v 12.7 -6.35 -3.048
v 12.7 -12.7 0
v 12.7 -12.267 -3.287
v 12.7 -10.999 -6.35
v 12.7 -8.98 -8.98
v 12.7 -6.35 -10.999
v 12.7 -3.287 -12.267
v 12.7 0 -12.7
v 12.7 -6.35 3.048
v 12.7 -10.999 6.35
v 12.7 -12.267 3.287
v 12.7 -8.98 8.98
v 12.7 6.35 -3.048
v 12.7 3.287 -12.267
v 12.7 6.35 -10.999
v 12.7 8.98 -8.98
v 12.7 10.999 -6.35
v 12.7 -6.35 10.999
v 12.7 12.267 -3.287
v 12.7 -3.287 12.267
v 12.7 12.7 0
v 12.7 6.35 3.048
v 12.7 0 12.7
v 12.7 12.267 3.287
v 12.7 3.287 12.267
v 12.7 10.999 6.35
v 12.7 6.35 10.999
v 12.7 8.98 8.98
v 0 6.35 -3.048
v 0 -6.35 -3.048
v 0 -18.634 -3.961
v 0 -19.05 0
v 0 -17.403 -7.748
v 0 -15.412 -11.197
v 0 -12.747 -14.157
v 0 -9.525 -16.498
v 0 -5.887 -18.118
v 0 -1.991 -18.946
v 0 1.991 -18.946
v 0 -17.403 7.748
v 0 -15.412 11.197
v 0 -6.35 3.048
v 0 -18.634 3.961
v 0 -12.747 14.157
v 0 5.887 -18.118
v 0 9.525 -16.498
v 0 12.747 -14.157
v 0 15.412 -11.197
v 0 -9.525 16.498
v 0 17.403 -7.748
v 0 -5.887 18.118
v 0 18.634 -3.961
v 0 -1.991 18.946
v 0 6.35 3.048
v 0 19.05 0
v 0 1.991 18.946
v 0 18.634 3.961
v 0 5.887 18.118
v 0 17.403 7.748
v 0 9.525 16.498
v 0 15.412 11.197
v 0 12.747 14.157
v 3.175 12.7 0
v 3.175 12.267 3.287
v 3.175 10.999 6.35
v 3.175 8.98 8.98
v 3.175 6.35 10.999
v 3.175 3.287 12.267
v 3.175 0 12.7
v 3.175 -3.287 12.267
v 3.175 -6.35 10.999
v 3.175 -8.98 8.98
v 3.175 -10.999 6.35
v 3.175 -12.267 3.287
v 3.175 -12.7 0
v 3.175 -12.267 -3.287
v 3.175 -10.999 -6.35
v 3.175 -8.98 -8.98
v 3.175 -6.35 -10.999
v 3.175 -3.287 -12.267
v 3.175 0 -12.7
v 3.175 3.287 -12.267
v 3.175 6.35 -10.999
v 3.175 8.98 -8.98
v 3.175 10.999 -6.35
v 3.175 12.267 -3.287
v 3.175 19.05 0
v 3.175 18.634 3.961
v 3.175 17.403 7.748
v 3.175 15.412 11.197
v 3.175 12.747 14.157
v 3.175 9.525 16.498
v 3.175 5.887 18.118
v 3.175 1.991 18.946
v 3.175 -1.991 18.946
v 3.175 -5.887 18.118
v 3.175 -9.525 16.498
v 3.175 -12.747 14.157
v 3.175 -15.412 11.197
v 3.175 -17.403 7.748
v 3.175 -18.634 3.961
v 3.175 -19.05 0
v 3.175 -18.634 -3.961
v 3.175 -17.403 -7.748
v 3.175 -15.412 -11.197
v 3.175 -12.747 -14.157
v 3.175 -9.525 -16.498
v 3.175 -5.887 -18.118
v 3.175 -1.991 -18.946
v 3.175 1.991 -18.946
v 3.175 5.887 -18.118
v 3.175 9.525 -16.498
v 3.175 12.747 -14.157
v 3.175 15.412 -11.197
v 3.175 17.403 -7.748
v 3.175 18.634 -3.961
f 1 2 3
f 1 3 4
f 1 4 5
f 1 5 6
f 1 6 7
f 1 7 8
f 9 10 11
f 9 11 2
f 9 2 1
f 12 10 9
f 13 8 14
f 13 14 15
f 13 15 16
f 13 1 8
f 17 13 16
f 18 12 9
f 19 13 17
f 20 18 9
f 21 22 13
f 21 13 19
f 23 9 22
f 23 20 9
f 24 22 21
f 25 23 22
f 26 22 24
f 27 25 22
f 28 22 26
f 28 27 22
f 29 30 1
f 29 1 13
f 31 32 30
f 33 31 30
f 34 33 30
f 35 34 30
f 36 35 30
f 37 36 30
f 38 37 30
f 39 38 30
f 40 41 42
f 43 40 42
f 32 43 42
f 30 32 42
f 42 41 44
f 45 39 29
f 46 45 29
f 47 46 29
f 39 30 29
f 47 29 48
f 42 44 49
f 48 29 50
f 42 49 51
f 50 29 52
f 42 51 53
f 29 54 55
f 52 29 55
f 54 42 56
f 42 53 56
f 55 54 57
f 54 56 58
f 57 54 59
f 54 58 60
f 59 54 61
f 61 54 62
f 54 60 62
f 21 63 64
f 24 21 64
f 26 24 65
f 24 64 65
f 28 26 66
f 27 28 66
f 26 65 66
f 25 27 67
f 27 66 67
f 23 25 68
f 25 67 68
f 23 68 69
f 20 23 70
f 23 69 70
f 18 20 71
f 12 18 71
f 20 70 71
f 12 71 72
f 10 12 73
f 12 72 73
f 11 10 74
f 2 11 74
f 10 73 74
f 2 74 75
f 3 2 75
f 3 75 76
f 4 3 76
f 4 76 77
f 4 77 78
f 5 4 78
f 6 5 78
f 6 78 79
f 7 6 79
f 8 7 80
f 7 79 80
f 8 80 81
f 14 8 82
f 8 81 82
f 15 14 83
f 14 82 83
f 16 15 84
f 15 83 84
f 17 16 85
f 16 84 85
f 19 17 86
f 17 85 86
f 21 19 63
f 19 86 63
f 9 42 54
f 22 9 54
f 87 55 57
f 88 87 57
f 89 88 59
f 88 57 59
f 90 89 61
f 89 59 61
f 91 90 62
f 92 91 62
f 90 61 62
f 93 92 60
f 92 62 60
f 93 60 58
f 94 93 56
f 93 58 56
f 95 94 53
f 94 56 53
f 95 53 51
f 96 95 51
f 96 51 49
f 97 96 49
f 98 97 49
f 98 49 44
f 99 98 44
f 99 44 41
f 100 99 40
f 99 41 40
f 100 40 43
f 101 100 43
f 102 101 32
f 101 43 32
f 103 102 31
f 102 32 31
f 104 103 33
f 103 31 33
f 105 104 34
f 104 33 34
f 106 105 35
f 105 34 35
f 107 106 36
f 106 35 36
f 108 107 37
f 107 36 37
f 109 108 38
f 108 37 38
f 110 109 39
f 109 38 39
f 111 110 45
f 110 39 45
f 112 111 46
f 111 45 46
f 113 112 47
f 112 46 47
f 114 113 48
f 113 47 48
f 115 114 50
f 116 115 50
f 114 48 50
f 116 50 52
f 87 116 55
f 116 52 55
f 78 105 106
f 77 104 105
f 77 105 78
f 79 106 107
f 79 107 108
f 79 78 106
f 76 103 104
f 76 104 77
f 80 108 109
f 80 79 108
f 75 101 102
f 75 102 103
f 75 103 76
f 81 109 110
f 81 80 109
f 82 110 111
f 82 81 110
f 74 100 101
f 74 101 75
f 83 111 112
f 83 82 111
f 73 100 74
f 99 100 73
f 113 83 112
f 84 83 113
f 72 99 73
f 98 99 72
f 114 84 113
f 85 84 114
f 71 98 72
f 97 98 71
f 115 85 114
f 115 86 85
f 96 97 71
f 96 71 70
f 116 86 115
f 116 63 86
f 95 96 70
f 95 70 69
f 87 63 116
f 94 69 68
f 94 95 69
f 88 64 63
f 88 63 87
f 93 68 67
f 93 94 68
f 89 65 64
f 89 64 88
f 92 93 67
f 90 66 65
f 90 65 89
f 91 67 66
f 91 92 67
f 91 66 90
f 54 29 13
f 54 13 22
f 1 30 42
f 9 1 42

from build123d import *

# Parameters (mm, degrees)
F0_R     = 19.05
F1_DEPTH = 3.175
F2_R     = 12.7
F3_DEPTH = 9.525
F4_W     = 12.7
F4_H     = 6.096
F5_DEPTH = 12.701


with BuildPart() as f1:
    # F0 (on Right) → F1 (new body)
    with BuildSketch(Plane.YZ):
        Circle(F0_R)
    extrude(amount=F1_DEPTH)

    # F2 (on face) → F3 (join)
    with BuildSketch(Plane.YZ.offset(3.175)):
        Circle(F2_R)
    extrude(amount=F3_DEPTH)

    # F4 (on Right) → F5 (cut, through all)
    with BuildSketch(Plane.YZ):
        Rectangle(F4_W, F4_H)
    extrude(amount=F5_DEPTH, mode=Mode.SUBTRACT)


solid = f1.part
